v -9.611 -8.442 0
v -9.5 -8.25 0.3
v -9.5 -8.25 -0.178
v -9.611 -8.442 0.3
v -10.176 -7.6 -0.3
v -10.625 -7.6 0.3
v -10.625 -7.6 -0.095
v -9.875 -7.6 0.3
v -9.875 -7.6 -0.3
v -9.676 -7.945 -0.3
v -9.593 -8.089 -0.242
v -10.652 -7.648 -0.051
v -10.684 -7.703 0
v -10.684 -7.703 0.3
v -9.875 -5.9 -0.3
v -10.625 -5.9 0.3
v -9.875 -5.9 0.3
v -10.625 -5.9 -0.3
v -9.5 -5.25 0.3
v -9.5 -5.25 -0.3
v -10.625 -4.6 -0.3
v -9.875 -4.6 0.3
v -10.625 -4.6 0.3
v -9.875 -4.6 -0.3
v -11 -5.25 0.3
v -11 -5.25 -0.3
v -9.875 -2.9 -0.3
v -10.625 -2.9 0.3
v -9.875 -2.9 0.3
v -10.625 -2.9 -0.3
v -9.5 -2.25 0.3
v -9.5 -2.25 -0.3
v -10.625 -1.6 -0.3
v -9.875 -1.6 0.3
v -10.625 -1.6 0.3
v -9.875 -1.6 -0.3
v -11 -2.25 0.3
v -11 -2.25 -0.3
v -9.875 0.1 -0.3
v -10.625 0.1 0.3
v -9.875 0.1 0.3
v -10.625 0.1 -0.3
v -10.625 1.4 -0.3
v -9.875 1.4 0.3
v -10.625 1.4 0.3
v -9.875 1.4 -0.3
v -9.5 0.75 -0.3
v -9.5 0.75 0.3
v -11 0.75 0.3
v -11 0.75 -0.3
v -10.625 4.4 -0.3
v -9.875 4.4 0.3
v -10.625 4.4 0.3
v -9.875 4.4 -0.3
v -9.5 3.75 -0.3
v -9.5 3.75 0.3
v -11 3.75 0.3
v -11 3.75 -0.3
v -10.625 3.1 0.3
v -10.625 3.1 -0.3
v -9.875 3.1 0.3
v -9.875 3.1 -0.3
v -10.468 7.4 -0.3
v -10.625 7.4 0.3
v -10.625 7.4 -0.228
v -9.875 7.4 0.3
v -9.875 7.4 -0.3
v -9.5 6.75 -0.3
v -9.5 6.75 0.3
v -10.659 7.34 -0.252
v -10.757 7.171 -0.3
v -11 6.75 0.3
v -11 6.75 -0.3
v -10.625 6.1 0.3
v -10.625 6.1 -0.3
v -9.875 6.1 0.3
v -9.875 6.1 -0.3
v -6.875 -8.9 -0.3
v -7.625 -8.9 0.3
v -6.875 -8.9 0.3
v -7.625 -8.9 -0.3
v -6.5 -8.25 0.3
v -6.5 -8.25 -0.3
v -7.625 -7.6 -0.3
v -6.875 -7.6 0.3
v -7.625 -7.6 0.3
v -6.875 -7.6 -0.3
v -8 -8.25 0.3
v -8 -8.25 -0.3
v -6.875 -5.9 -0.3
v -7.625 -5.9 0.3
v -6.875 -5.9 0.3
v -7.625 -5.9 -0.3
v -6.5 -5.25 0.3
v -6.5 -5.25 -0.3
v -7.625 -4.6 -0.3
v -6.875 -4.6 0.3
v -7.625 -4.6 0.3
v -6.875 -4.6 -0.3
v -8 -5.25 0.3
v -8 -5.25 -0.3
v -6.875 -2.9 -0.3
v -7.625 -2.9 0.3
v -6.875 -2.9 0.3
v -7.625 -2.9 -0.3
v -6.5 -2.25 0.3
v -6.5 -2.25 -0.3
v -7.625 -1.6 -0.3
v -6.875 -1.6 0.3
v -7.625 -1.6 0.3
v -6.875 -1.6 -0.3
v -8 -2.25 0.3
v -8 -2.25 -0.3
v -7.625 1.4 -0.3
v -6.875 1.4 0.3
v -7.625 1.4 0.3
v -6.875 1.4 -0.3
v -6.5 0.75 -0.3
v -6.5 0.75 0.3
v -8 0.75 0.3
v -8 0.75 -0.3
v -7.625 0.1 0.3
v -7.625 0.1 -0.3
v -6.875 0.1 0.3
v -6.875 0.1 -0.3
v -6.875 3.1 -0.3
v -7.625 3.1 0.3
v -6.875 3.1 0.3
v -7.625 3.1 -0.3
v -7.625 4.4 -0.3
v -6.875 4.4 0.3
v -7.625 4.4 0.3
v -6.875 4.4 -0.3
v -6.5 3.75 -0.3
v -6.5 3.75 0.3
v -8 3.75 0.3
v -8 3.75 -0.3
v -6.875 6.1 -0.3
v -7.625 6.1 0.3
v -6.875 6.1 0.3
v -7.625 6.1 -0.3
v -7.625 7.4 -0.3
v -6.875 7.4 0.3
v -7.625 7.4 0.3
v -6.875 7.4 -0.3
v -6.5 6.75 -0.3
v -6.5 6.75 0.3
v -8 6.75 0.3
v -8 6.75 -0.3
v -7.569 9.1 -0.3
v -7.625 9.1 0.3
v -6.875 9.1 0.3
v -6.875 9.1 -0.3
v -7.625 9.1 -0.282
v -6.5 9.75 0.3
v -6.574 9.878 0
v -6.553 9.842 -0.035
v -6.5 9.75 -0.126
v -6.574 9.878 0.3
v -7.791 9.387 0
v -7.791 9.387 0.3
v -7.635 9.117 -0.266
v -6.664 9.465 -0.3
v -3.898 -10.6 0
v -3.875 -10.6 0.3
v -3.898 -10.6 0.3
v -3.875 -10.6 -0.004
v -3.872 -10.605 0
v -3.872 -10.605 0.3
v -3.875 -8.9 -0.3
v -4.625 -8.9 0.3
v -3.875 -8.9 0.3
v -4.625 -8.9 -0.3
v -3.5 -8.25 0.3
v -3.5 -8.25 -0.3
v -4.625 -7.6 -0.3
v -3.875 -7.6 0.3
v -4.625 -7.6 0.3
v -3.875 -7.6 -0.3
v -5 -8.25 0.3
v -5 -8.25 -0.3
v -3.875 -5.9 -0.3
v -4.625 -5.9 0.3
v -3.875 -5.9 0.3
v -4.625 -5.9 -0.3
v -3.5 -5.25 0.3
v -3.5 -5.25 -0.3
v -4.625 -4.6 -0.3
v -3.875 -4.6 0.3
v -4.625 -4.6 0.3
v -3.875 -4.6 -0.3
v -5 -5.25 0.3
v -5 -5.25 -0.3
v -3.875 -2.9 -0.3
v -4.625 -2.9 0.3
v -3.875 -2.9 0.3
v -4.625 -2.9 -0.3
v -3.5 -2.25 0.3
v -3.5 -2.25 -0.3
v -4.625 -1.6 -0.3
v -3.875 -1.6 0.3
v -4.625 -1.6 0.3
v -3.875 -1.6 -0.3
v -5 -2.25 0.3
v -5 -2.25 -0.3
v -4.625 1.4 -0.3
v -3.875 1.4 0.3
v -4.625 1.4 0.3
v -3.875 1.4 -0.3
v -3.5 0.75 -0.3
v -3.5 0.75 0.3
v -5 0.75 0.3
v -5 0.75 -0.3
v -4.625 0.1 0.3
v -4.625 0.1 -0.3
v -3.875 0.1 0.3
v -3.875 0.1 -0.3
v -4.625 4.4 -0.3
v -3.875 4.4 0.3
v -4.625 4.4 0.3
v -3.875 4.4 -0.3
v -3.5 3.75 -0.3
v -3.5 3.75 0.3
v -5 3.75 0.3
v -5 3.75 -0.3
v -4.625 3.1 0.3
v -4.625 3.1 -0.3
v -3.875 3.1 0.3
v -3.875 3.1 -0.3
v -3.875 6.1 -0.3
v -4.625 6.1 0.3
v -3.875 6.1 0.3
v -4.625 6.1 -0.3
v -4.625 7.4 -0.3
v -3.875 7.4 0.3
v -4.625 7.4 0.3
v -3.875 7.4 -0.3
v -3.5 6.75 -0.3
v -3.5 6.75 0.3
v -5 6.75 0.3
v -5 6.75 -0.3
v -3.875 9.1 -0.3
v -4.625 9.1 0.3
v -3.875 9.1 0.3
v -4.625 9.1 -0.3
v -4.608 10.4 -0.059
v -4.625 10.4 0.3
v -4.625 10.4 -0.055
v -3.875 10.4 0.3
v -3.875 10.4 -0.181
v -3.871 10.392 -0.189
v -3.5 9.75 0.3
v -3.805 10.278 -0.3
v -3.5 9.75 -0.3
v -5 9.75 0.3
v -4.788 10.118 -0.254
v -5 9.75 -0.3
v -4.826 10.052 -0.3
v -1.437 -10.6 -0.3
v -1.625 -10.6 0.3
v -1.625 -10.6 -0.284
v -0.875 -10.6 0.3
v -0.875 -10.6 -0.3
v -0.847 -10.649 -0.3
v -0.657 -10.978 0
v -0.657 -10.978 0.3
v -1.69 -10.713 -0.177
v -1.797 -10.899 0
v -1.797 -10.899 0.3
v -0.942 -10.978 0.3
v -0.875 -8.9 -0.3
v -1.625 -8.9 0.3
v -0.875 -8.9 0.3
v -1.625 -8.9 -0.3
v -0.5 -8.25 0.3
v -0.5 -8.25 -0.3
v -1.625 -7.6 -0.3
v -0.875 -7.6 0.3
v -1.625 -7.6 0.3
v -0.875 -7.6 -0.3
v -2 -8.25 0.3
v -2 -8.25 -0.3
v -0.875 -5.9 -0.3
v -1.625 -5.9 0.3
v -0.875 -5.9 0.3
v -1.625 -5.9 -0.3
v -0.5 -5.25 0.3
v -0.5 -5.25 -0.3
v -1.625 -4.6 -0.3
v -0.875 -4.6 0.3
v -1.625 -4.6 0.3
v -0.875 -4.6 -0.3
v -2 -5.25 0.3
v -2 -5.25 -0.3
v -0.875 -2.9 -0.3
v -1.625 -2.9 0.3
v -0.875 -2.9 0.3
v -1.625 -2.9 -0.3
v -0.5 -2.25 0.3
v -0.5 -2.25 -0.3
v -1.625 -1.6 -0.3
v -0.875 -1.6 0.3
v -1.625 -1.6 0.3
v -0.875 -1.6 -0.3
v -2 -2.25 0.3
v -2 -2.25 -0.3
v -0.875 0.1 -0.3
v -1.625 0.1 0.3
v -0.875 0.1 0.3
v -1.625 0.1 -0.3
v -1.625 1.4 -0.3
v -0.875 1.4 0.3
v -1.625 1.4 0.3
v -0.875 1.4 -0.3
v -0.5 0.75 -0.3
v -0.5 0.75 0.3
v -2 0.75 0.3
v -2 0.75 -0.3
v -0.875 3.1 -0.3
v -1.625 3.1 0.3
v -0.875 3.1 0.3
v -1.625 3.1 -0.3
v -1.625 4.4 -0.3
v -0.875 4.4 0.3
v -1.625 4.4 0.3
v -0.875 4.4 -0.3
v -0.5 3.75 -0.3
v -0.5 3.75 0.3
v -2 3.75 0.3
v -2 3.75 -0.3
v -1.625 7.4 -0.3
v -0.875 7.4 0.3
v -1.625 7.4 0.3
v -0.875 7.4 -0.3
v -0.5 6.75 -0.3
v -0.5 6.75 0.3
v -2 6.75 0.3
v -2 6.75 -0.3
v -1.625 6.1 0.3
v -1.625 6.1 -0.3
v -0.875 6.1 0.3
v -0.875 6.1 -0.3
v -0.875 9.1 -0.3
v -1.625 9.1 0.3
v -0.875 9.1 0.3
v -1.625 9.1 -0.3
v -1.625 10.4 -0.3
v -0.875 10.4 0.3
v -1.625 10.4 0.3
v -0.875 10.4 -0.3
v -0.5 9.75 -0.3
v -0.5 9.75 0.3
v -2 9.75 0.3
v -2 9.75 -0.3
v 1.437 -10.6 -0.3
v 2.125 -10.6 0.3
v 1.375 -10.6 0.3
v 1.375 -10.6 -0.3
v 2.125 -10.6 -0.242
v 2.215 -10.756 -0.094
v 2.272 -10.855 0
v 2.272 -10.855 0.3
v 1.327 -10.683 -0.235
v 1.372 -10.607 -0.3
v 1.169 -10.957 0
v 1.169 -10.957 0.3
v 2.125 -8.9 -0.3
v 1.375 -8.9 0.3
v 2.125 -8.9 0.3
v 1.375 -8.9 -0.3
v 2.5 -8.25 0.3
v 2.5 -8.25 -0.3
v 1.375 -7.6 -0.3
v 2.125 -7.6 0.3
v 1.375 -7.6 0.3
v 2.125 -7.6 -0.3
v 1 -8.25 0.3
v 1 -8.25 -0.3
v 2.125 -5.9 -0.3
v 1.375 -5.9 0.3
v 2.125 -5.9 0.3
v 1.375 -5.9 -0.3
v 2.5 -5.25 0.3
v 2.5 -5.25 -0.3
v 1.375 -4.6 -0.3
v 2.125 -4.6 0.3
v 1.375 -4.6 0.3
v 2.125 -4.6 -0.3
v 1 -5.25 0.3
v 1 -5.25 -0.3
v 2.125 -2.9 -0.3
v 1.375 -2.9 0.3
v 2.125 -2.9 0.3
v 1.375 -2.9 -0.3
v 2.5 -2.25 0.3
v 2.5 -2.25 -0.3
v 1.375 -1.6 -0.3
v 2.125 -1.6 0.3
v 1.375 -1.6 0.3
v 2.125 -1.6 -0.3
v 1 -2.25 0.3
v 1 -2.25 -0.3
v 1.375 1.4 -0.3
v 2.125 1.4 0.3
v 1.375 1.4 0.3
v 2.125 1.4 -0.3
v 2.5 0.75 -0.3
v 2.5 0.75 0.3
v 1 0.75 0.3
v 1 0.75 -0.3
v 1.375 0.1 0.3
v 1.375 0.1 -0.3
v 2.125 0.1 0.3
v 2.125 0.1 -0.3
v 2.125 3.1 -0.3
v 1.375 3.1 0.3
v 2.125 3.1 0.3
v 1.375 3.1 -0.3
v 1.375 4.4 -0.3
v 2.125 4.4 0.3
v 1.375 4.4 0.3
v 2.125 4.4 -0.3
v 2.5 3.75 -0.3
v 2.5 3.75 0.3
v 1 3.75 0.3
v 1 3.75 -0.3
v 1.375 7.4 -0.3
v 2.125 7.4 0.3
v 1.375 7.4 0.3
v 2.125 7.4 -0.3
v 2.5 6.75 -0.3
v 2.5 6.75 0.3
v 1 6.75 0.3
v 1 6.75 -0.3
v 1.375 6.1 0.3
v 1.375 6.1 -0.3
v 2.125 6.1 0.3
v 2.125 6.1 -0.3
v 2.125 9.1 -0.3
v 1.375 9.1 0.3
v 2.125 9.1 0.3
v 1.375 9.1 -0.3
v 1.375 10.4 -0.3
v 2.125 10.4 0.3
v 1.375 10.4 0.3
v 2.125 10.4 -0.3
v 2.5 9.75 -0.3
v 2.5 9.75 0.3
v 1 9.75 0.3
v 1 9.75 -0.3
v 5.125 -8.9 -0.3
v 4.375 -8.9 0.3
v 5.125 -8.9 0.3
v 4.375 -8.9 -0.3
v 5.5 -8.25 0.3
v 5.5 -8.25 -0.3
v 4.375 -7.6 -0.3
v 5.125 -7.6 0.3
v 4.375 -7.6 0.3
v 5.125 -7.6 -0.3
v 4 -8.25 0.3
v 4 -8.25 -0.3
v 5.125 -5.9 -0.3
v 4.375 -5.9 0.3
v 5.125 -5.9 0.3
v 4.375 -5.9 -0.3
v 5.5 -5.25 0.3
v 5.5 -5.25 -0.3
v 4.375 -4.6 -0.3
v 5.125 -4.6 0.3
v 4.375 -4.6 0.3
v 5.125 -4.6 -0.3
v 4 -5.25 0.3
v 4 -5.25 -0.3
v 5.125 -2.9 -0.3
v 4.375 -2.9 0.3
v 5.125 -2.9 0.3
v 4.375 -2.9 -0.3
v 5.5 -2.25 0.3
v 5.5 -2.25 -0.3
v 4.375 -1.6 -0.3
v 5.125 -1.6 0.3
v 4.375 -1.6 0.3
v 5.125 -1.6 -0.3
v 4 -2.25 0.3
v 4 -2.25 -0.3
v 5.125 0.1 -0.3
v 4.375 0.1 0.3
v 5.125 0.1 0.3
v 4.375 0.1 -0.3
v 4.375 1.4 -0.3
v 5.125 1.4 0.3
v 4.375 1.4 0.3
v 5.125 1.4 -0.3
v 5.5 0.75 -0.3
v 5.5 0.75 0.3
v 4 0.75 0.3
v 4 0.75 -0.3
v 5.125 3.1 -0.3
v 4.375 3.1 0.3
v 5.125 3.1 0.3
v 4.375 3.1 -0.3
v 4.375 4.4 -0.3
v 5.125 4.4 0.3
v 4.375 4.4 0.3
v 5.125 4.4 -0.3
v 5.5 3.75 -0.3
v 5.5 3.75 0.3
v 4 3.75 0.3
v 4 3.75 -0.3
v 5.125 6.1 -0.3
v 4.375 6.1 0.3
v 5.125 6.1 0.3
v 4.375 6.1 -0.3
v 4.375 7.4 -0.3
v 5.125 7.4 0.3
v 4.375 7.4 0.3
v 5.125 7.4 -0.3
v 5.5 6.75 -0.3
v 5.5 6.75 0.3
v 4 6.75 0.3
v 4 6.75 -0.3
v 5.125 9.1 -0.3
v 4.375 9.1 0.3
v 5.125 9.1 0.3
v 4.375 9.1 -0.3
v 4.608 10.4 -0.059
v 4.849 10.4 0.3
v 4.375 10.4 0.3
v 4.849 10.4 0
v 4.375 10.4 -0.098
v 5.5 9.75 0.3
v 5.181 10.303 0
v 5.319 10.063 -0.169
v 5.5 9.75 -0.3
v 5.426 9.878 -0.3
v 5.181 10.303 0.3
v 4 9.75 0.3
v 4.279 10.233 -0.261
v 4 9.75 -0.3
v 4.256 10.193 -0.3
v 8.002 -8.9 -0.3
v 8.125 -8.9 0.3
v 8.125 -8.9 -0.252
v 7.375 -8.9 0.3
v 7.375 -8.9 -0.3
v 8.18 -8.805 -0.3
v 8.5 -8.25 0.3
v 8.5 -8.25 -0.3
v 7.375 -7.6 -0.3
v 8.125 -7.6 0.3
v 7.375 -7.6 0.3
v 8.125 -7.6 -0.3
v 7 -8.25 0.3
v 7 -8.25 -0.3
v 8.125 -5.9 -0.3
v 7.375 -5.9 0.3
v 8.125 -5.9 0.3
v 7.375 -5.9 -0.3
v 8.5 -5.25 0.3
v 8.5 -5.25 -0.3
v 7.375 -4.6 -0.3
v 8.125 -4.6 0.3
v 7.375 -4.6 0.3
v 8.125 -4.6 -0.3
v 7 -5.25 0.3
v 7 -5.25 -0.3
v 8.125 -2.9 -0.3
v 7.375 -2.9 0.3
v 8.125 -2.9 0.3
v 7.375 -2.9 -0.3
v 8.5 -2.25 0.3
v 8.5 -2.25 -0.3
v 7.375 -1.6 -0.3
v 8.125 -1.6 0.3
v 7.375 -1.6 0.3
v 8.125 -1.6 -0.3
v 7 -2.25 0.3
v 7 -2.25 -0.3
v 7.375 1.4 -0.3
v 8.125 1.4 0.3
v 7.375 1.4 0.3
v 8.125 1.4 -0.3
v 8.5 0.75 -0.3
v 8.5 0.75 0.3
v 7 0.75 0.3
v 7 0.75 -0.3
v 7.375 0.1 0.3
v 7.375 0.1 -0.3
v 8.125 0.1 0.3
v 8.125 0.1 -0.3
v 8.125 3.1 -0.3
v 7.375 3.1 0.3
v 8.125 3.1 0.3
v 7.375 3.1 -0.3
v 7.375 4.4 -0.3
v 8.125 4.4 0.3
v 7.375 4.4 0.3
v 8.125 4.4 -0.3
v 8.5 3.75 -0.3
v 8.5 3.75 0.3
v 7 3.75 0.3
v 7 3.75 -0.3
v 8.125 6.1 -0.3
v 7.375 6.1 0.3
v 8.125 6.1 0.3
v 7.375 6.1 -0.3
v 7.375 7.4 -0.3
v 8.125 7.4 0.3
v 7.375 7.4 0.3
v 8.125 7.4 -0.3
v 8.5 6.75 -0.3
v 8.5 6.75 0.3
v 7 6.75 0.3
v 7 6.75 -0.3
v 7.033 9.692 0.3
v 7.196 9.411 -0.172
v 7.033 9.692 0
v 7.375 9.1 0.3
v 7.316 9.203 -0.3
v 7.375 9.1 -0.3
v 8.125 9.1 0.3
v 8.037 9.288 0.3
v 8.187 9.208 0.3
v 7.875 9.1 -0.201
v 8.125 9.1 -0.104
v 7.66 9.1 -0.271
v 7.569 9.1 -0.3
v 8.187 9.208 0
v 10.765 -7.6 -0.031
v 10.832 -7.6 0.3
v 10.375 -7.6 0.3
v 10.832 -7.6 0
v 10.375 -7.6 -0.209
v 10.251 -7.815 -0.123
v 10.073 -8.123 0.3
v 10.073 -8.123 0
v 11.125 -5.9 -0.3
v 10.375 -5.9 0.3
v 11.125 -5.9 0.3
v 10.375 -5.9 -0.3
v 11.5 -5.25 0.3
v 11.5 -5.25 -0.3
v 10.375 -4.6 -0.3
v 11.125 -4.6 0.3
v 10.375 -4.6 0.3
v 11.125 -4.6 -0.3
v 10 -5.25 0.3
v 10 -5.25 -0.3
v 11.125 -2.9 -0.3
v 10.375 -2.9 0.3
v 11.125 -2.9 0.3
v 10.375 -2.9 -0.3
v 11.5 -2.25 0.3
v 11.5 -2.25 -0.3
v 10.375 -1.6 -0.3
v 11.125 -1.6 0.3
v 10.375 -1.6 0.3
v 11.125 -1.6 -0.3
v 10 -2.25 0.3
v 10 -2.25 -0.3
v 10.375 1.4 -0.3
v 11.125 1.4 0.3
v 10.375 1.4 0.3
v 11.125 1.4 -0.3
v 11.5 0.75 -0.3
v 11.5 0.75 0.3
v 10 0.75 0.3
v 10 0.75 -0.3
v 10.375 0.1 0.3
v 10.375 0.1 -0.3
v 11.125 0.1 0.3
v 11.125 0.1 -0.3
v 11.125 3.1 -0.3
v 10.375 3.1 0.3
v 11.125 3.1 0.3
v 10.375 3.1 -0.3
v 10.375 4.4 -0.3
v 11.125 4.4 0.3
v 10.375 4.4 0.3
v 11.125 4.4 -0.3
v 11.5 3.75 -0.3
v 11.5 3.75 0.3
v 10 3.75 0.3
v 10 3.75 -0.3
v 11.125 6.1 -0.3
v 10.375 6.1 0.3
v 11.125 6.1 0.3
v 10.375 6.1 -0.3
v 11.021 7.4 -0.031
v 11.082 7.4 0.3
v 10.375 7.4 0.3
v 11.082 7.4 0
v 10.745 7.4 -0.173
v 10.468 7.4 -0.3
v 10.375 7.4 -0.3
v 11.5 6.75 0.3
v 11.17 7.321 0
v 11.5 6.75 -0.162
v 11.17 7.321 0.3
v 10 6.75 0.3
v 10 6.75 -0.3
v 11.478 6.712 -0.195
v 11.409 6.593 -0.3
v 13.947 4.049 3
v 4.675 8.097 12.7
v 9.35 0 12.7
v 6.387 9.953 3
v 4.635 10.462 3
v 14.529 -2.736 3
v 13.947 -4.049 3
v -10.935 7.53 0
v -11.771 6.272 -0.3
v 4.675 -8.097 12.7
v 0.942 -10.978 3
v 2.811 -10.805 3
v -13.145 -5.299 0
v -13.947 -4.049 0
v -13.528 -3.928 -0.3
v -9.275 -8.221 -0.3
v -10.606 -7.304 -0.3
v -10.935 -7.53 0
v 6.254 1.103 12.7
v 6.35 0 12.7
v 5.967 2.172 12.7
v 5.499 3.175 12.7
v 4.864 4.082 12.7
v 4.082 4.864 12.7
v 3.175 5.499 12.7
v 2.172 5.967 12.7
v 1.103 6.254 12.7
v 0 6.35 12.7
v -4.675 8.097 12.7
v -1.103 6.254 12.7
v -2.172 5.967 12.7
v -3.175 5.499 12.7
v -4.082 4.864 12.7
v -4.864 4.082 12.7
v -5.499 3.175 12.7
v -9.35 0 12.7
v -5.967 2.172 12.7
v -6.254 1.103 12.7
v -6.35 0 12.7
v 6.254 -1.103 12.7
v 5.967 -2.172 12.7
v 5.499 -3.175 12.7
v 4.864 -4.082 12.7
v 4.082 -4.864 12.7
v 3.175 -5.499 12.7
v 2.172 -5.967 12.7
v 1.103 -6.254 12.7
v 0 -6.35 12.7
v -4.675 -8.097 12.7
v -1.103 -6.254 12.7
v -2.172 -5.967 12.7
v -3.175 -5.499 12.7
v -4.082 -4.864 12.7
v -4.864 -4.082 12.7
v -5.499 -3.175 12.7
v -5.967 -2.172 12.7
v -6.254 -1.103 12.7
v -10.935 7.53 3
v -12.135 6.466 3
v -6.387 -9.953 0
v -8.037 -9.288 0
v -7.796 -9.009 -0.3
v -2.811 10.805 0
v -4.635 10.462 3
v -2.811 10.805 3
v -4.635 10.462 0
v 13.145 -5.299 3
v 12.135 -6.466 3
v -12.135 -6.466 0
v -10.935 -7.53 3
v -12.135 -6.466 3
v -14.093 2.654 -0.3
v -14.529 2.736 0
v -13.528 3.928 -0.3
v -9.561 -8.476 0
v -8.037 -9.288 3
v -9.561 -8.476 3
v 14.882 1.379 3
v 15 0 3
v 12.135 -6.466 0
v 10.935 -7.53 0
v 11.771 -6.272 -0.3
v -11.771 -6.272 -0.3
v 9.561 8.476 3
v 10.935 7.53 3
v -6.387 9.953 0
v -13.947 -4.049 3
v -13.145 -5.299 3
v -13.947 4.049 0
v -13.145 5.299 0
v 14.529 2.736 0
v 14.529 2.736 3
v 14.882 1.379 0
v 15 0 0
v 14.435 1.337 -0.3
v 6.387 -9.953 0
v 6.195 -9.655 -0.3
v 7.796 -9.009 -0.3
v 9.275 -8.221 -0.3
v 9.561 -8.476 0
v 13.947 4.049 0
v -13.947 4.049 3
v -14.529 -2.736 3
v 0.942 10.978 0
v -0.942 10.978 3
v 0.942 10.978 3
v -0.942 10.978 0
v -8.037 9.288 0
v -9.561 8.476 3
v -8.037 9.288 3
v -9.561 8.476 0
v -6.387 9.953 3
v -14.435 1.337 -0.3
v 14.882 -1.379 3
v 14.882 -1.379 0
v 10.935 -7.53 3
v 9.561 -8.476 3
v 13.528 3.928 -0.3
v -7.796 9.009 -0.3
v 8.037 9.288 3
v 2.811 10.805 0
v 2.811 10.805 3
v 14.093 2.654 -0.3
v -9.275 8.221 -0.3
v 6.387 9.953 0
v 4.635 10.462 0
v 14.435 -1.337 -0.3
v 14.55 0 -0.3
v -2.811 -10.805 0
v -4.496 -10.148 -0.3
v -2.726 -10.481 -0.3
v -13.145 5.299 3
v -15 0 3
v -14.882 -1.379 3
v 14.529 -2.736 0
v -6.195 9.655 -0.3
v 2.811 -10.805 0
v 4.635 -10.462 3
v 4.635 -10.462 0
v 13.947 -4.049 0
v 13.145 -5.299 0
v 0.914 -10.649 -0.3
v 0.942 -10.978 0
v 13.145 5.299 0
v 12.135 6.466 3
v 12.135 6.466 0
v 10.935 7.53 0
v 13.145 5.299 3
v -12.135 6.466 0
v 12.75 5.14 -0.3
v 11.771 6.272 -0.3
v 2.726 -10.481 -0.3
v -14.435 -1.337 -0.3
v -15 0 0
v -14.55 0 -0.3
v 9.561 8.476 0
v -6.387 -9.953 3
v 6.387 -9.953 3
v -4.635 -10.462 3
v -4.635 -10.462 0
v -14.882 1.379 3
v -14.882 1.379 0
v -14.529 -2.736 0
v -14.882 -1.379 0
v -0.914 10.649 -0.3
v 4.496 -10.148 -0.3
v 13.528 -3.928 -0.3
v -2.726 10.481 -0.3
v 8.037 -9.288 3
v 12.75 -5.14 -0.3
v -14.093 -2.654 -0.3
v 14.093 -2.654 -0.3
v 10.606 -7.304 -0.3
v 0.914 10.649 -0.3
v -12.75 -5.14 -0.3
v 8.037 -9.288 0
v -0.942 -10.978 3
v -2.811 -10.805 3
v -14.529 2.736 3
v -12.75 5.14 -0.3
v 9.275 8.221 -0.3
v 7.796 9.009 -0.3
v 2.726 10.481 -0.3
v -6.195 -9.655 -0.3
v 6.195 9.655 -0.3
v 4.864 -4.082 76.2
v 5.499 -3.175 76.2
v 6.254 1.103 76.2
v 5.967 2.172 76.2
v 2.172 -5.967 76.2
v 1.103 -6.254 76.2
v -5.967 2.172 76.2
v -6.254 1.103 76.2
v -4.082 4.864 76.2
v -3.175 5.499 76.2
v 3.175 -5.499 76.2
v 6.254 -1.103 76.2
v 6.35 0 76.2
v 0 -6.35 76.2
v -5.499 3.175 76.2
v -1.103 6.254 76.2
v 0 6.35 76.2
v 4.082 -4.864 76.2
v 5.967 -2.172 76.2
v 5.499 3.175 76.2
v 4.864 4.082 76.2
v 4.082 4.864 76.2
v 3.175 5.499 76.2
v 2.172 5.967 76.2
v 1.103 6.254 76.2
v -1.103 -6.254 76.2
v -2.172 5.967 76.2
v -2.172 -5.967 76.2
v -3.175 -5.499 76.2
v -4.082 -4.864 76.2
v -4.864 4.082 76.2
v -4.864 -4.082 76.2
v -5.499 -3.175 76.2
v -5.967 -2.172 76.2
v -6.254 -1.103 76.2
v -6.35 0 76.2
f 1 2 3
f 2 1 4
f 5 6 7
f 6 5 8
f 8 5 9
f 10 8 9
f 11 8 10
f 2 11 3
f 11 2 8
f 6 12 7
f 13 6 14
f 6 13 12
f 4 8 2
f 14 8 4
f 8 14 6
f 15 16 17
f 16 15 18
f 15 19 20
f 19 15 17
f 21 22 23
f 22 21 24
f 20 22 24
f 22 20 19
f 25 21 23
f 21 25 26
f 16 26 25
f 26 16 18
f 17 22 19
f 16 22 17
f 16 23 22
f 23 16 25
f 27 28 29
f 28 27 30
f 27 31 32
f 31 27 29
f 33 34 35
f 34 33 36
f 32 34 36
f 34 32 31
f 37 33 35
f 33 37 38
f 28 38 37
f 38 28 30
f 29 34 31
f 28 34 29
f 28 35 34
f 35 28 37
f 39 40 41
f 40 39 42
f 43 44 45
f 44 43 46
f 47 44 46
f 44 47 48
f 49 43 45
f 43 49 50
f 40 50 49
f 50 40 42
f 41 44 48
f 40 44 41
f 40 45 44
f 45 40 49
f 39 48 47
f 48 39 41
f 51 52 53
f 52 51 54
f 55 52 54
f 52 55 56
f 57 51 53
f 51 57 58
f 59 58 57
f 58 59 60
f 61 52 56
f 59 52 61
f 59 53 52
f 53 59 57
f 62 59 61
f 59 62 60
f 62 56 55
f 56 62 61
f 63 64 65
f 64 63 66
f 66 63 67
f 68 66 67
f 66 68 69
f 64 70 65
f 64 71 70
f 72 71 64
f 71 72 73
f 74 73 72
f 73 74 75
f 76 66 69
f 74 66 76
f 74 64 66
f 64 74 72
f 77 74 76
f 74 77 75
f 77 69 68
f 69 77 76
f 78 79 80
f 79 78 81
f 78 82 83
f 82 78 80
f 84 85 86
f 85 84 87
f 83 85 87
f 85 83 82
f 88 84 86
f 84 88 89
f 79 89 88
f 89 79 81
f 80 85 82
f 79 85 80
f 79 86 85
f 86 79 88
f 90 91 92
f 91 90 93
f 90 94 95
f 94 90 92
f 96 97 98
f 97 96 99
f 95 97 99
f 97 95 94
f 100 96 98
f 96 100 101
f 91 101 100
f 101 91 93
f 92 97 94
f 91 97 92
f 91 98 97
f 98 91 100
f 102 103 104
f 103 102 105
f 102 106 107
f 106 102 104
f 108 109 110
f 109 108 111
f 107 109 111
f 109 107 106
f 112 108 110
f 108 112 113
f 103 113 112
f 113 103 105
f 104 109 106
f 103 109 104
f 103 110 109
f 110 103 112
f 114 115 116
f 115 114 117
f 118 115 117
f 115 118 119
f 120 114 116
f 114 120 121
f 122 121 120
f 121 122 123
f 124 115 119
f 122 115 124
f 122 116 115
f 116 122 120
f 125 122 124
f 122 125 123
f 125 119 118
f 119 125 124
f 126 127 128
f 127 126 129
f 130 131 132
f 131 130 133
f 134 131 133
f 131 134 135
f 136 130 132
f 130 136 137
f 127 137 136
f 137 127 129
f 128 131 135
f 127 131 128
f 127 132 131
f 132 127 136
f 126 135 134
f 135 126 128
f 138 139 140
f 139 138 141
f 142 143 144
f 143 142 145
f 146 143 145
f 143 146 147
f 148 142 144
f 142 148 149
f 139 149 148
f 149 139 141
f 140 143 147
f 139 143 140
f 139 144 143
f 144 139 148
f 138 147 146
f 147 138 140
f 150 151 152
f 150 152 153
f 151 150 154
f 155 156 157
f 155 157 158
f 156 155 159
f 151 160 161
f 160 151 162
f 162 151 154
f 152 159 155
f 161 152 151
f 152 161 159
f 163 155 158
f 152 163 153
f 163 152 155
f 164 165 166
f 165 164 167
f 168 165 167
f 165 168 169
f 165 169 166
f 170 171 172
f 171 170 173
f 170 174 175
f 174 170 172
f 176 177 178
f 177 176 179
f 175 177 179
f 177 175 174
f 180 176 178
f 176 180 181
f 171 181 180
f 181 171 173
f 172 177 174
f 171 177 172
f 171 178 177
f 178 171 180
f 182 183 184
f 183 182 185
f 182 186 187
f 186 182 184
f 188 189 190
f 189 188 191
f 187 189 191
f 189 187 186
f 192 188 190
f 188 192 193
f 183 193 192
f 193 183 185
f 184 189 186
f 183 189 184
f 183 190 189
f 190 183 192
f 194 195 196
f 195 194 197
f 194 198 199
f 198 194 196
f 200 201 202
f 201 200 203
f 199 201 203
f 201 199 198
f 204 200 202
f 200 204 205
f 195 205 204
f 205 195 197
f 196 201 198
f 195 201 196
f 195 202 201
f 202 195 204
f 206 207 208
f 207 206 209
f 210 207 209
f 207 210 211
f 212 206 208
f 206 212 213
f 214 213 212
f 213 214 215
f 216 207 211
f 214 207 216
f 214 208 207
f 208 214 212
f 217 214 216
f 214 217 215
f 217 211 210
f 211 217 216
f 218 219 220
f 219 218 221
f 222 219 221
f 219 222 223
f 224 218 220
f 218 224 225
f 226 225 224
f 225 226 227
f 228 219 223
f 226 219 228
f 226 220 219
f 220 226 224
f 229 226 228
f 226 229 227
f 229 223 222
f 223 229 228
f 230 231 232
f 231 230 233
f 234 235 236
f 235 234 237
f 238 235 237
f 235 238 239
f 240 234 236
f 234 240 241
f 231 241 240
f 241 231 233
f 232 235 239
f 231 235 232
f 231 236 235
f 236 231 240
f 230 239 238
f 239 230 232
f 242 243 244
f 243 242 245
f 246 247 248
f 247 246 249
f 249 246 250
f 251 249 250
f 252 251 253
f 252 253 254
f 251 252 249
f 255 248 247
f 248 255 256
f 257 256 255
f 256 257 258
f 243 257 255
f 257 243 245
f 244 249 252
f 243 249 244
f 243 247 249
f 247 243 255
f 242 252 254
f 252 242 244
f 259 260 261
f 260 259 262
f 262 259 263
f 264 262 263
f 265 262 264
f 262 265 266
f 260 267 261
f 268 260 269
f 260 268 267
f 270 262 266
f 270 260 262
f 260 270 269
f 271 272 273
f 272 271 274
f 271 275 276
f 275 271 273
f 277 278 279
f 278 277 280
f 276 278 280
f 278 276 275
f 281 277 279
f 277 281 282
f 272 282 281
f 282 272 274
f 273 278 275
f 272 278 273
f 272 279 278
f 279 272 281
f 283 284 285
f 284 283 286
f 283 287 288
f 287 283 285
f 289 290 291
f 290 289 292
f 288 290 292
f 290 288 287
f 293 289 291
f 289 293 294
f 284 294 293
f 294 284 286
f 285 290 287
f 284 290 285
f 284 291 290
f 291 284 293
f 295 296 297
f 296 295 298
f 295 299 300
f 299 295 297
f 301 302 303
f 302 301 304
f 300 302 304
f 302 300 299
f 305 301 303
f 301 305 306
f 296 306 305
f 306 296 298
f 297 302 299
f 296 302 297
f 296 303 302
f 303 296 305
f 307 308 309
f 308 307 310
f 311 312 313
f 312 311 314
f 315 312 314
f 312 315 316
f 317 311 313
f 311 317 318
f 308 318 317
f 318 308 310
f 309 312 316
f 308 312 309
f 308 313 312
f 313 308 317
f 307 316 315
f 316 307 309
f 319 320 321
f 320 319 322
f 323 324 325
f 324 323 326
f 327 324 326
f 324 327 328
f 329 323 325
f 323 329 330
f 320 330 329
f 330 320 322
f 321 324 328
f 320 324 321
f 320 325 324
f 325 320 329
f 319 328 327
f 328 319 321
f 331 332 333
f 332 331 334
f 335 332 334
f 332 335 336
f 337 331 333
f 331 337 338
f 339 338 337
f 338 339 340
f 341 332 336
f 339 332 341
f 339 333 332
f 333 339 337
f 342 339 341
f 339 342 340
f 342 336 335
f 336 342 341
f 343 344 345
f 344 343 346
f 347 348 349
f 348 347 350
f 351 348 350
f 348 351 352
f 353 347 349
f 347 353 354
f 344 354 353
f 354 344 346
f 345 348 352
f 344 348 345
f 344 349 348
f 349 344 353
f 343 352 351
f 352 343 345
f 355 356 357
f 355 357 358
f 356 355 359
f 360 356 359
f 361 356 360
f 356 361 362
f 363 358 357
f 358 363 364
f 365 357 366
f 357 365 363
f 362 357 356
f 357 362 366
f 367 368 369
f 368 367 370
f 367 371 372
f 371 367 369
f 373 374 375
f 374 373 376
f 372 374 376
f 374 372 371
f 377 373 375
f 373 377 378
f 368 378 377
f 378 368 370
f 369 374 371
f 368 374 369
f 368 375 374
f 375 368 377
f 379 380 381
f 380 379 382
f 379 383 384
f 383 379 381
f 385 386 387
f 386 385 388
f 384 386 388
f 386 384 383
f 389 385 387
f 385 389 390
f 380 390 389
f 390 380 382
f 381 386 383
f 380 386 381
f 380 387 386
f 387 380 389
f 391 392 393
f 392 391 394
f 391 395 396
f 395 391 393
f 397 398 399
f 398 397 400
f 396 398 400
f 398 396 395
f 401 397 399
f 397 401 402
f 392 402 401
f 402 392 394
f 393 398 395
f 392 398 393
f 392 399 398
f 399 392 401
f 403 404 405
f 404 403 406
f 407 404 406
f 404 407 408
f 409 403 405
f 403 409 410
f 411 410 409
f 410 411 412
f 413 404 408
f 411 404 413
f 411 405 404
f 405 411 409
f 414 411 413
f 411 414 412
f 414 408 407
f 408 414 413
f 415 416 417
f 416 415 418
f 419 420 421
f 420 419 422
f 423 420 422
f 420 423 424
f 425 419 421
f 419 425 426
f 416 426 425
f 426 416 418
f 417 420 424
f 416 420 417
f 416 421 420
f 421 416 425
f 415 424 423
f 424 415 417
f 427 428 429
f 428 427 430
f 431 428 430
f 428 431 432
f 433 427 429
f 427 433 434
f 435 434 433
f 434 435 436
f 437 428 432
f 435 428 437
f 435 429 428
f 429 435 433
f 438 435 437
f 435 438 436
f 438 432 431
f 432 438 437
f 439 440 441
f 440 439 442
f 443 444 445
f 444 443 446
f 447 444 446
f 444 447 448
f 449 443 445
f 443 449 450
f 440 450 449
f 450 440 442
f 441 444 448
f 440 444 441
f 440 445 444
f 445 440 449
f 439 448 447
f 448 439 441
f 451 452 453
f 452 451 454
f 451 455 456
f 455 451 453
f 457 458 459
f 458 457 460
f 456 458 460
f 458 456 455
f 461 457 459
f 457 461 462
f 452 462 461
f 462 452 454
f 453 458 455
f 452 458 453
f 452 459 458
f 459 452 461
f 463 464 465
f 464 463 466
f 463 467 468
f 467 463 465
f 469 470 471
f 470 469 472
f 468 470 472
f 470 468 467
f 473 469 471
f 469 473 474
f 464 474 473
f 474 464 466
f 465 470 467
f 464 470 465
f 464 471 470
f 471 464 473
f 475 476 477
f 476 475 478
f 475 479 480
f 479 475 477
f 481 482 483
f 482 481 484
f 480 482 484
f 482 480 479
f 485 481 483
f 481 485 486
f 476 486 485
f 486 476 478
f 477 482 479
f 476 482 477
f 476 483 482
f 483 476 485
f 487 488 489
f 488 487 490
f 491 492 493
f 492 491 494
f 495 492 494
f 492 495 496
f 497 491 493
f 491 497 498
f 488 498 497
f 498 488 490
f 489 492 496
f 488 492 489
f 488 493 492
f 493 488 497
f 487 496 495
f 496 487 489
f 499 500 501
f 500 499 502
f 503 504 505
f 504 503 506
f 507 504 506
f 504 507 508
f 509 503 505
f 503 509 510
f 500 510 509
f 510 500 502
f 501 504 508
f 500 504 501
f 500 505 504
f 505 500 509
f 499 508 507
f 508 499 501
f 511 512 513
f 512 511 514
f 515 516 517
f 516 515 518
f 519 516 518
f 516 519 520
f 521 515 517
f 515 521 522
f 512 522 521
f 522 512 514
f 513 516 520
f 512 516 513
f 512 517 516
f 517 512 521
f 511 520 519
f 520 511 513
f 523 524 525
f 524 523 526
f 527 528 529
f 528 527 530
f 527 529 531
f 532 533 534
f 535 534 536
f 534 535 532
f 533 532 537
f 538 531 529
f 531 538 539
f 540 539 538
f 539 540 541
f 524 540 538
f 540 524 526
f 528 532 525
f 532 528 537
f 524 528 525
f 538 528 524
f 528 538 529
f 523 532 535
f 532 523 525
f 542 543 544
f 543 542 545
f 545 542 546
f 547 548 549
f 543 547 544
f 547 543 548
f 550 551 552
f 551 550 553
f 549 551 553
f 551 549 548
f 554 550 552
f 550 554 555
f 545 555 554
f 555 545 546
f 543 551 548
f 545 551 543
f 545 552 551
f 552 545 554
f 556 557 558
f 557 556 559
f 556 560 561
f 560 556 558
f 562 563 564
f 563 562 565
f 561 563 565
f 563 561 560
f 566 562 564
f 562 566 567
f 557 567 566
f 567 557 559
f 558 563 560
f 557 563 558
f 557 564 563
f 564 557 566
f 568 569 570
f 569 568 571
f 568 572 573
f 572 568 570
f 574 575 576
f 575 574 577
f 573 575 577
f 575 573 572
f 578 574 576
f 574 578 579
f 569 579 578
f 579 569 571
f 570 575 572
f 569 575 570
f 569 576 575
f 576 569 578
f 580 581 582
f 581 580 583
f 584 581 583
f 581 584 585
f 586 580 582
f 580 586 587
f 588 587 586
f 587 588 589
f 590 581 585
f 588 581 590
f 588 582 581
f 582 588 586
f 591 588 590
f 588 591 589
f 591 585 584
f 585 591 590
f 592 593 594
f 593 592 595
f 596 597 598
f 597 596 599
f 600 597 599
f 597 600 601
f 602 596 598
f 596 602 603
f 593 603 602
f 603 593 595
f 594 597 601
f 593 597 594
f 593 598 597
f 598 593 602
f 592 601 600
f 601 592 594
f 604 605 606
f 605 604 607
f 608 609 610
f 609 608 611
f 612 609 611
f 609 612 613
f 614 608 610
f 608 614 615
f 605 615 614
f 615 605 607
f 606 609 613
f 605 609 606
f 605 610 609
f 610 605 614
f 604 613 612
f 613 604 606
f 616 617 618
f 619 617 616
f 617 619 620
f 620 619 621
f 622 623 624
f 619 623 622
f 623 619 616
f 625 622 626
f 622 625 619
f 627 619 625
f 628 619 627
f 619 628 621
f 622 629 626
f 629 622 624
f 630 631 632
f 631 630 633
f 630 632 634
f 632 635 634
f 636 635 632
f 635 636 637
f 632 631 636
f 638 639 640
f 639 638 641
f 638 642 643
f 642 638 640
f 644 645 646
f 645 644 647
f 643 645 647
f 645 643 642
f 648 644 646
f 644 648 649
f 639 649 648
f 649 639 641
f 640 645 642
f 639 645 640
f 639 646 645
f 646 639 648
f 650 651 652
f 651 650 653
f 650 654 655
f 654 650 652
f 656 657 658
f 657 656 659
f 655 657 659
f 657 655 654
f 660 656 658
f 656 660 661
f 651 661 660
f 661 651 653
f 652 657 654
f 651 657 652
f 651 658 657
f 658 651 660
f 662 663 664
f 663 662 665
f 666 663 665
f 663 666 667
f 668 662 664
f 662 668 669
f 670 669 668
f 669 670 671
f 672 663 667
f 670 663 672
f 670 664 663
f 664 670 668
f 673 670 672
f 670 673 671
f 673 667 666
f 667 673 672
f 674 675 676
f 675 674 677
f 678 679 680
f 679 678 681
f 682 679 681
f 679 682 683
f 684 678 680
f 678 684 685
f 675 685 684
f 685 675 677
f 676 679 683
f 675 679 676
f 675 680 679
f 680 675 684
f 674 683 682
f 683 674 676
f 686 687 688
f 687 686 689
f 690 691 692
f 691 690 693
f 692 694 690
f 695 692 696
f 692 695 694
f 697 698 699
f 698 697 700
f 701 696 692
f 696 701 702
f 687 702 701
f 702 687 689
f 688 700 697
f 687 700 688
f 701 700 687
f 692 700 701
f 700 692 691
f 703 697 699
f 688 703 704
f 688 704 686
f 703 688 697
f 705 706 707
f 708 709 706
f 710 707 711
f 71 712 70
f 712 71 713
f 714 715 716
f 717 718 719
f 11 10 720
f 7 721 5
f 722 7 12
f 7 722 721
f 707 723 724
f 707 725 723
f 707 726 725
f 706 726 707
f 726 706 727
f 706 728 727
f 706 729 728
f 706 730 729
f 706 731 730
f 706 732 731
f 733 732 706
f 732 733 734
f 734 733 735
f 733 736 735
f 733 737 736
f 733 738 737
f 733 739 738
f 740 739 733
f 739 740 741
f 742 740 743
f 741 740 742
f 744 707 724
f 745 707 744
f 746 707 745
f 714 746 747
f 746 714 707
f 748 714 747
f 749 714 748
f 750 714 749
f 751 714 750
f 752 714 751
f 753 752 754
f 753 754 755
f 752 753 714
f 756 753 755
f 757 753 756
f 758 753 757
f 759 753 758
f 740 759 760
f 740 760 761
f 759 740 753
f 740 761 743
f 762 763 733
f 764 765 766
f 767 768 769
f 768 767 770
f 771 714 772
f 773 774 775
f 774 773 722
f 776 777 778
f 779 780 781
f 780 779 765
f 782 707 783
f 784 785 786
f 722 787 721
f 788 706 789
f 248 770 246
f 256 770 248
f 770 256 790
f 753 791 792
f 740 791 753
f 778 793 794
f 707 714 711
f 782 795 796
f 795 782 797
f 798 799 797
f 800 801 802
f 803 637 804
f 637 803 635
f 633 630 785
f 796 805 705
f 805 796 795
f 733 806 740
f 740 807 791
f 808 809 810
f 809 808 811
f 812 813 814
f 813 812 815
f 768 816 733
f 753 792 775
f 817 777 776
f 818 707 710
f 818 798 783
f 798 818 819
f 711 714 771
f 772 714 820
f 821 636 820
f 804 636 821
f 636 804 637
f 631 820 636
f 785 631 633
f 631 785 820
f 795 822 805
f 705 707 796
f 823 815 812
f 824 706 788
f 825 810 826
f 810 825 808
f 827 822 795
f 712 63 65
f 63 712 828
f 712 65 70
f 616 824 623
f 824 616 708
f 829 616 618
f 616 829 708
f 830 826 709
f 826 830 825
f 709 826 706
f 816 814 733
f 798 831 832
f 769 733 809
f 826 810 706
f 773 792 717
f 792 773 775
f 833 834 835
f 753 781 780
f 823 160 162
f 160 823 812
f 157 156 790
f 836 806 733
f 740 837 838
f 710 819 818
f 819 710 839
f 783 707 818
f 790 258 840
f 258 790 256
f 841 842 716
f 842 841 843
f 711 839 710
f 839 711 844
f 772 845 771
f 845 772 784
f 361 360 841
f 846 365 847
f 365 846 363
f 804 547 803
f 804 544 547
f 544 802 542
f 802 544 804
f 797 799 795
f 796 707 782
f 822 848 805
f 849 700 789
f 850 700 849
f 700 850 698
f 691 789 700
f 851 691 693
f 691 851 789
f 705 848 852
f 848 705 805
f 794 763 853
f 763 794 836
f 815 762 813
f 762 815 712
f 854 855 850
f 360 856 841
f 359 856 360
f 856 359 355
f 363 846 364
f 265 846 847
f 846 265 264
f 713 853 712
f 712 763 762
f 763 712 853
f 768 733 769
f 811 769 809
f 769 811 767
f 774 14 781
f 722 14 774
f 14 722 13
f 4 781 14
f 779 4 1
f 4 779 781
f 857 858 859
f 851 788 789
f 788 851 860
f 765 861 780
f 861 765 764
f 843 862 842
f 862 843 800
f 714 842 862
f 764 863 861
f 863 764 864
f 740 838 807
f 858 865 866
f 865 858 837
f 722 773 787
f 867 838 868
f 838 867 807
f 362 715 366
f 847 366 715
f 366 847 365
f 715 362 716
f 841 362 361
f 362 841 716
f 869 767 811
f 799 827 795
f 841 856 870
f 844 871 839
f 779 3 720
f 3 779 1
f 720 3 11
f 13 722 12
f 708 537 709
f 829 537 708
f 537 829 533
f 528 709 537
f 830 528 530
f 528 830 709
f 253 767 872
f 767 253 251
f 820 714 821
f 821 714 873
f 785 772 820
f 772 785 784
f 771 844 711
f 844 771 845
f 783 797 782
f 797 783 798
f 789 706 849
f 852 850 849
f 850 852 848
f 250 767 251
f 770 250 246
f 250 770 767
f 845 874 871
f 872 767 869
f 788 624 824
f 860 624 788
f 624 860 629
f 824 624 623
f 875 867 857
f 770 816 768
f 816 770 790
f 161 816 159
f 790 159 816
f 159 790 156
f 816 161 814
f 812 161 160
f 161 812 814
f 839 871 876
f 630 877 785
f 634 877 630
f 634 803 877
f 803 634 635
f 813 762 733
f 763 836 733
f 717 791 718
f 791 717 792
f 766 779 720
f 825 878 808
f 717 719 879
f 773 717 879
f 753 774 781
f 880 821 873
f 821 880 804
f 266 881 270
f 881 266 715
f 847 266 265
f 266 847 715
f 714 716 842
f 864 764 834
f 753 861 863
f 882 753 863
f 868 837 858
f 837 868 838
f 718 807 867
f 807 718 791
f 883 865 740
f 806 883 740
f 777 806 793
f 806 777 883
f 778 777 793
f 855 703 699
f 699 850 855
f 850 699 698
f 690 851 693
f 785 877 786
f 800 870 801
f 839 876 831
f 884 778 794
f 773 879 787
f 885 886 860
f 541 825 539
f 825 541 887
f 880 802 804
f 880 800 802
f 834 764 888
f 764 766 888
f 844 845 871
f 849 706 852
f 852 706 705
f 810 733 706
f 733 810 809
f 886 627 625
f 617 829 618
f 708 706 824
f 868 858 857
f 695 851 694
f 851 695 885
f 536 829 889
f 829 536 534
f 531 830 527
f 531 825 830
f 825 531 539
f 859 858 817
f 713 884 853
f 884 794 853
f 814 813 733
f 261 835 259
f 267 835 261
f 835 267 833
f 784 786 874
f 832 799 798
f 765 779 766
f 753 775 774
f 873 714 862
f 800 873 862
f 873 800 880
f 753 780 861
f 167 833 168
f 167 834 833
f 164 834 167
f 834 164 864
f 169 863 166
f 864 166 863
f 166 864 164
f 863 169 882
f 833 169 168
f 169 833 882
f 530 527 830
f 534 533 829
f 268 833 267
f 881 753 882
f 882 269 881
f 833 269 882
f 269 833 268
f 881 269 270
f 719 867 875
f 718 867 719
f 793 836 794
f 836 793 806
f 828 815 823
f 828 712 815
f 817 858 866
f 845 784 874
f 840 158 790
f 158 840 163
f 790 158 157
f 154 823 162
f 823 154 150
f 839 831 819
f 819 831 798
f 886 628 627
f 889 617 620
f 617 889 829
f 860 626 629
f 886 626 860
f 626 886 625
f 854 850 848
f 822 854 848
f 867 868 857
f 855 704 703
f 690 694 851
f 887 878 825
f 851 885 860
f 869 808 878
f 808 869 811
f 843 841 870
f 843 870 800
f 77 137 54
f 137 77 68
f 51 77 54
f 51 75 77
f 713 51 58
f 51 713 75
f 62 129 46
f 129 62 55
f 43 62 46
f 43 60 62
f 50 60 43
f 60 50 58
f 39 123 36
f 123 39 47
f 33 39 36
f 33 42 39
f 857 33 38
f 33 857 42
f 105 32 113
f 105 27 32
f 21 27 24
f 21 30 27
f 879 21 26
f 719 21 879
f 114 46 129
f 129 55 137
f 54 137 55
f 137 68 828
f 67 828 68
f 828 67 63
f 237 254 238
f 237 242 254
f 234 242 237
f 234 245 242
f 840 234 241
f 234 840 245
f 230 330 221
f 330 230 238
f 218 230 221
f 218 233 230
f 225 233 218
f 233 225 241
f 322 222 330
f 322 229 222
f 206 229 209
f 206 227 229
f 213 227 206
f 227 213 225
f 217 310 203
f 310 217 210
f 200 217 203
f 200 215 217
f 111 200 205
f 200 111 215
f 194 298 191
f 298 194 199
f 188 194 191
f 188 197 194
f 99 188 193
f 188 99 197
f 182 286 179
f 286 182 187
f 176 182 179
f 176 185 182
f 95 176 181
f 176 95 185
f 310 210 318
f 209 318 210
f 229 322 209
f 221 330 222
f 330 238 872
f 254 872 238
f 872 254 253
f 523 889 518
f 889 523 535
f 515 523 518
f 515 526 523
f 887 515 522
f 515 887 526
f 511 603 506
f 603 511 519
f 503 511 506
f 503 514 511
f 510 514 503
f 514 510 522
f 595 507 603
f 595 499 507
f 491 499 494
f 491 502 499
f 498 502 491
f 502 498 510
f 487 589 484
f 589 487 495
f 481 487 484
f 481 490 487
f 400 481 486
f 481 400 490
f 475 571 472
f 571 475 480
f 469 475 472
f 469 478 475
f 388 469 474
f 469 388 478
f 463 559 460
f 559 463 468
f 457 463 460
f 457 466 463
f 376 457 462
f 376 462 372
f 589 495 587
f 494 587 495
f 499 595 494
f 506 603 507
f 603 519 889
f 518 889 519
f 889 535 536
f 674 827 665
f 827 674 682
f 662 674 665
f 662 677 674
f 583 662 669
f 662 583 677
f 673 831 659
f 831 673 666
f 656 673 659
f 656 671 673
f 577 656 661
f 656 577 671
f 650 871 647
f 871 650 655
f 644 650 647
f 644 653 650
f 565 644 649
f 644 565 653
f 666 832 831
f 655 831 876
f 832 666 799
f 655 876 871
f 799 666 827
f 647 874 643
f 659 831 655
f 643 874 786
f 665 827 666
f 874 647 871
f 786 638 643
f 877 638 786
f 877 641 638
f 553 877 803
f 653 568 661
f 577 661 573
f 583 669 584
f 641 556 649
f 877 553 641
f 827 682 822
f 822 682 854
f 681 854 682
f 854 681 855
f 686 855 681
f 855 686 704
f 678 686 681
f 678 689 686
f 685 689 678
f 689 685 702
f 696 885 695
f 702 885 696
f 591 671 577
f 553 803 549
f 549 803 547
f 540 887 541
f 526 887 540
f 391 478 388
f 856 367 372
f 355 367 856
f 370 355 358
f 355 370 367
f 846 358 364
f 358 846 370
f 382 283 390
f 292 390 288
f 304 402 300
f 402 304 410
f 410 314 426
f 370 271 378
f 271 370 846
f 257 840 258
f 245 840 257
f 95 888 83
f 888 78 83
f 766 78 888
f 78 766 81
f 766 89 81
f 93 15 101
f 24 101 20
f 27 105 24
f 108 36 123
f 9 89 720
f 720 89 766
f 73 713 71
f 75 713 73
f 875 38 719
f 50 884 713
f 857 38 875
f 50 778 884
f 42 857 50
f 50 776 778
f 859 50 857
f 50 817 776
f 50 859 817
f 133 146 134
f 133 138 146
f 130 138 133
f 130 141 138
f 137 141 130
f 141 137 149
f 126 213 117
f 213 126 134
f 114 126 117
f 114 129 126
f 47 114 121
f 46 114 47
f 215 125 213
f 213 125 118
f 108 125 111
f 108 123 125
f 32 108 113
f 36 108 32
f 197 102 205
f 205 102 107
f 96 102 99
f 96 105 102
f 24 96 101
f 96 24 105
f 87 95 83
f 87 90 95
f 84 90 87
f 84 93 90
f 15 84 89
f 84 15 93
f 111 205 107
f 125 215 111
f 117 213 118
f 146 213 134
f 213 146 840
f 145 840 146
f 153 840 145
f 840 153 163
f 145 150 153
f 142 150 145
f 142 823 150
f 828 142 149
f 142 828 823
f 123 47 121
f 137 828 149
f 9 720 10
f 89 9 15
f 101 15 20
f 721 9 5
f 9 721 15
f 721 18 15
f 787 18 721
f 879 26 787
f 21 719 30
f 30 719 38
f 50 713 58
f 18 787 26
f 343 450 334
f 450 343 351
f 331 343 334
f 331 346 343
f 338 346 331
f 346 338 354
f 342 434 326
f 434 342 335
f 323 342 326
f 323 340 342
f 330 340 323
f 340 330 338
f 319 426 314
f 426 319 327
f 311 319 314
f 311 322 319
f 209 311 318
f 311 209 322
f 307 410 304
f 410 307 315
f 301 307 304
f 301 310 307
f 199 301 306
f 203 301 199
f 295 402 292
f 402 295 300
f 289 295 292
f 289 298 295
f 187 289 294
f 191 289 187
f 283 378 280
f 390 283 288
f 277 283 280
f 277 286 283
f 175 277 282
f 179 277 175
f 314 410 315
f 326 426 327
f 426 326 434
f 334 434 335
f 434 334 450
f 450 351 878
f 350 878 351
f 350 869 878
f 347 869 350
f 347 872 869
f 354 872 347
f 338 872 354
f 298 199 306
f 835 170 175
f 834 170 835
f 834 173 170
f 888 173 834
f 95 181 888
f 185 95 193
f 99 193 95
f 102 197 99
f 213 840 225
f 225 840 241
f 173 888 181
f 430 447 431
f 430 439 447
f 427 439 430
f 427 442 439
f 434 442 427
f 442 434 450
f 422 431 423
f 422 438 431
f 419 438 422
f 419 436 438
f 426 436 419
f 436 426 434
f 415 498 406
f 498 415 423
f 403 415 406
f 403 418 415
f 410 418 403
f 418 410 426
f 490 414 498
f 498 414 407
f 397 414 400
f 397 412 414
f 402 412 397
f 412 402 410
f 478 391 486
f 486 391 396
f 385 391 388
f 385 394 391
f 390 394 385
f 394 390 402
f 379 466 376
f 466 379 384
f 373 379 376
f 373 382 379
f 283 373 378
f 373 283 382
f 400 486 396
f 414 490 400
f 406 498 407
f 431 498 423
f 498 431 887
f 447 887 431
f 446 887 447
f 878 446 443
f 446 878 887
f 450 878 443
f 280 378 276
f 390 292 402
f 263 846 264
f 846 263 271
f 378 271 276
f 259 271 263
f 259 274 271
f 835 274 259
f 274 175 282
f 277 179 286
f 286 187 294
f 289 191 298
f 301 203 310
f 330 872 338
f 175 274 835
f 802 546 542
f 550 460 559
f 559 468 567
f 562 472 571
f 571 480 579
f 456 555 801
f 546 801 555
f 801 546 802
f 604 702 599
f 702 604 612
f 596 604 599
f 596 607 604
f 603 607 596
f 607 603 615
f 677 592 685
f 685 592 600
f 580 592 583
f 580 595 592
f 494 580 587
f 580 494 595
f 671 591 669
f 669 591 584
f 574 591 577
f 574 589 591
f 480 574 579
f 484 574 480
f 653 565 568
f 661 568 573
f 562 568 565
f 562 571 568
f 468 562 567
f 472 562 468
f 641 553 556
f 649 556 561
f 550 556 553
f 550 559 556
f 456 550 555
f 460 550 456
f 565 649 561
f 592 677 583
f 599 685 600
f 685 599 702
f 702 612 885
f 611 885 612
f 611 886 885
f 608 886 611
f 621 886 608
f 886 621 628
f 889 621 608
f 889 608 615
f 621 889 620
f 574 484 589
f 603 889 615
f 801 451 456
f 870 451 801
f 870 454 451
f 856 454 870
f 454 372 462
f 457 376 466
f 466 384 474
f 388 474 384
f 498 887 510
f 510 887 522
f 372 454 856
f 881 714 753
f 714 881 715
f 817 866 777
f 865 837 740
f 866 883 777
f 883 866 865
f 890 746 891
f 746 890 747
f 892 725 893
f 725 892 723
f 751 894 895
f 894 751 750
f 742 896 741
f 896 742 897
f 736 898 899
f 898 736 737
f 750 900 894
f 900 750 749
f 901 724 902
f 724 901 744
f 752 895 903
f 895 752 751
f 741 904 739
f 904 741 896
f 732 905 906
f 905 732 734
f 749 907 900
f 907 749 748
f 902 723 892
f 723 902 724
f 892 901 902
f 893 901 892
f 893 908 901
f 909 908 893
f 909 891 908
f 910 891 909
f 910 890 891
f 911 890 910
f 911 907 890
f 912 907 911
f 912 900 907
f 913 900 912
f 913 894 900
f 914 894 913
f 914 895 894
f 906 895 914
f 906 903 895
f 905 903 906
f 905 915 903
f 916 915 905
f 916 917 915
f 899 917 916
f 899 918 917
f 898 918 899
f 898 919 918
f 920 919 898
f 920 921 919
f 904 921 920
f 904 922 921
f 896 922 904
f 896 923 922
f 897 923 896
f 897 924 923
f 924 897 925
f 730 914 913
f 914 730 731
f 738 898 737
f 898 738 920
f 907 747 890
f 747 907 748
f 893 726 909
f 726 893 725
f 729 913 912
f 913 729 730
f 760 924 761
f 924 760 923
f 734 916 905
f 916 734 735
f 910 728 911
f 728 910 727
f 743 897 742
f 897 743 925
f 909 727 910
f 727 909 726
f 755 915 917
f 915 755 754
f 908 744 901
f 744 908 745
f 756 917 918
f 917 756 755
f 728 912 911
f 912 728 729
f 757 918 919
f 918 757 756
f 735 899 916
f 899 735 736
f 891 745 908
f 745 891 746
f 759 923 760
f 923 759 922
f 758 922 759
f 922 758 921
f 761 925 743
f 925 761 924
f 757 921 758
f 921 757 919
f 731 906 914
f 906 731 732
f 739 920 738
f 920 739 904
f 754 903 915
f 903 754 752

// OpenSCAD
//Title: Cabochon Template and Dop Stick Mount
//Author: Alex English - ProtoParadigm
//Date: 8/5/16
//License: Creative Commons - Share Alike - Attribution

//Notes: This is intended to be used as a printed dop stick for cutting and finishing cabochons. The base forms a template that can be used as a guide for shaping rounds and ovals in any size.


IN=25.4*1; //multiplication by 1 to prevent customizer from presenting this as a configurable value

//Diameter of the shaft of the dop stick (inches)
dop_stick_diameter = 0.5;
dop_stick_d = dop_stick_diameter*IN;

//Length of the dop stick (if enabled) (inches)
length=3;
l=length*IN;

//Height of the template (the length of the taper) (inches) - Only change if there is a problem
height=0.5;
h=height*IN;

//Enable or disable the texture on the template surface
texture=1; //[1:Enable,0:Disable]

//Enable or disable printing the dop stick - if disabled, a socket will be printed for a dowel to be inserted
stick=1; //[1:Enable,0:Disable]

//Enable or disable a notch on the end of the dop stick for indexing in a holder - only used if the stick is enabled
notch=0; //[1:Enable,0:Disable]

//Round or Oval
shape="oval";//["round":Round,"oval":Oval]

//Major Diameter
major=30;

//Minor Diameter (set smaller than major) (not used for rounds)
minor=22;

template_thick = 3*1; //not intended to be configurable - the thickness of the template

wall=3*1; //not intended to be configurable - the extra width at the socket for the template that the stick can be inserted into

hole_d=1.5*1;//not intended to be configurable - the size of the holes that make up the texture on the bottom surface

module cab_oval(a, b)
{
    scale([1, min(a,b)/max(a,b), 1]) cylinder(d=max(a,b),h=template_thick, $fn=50);
    translate([0, 0, -0.3]) scale([0.97, 0.97, 1]) scale([1, min(a,b)/max(a,b), 1]) cylinder(d=max(a,b),h=template_thick, $fn=50);
}

module cab_round(a)
{
    cab_oval(a, a);
}

//acceptable types are "round","oval"
//round must have two dimensions passed, the larger will be used
module template(type,a,b)
{
    difference()
    {
        hull()
        {
            cylinder(d=wall*2+dop_stick_d, h=h, $fn=6);
            if(type=="oval")
                cab_oval(a, b);
            else if(type=="round")
                cab_round(a);
        }
     if(texture) for(x=[-b/2:hole_d*2:b/2]) for(y=[-a/2:hole_d*2:a/2]) translate([x+hole_d/2, y+hole_d/2, -0.4]) cylinder(d=hole_d, h=0.7, $fn=6);
     }
 }
 
module template_mount(type, a, b)
{
    difference()
    {
        template(type, a, b);
        translate([0, 0, wall]) cylinder(d=dop_stick_d, h=h-wall+1, $fn=32);
    }       
}

module template_with_stick(type, a, b)
{
    template(type, a, b);
    difference()
    {
        translate([0, 0, wall]) cylinder(d=dop_stick_d, h=l-wall, $fn=36);
        if(notch) { translate([-dop_stick_d/2-1, -3/2, -3+l]) cube([dop_stick_d+2, 3, 3+1]); }
    }
}

if(stick) { template_with_stick(shape,major,minor); }
else { template_mount(shape, major, minor); }
